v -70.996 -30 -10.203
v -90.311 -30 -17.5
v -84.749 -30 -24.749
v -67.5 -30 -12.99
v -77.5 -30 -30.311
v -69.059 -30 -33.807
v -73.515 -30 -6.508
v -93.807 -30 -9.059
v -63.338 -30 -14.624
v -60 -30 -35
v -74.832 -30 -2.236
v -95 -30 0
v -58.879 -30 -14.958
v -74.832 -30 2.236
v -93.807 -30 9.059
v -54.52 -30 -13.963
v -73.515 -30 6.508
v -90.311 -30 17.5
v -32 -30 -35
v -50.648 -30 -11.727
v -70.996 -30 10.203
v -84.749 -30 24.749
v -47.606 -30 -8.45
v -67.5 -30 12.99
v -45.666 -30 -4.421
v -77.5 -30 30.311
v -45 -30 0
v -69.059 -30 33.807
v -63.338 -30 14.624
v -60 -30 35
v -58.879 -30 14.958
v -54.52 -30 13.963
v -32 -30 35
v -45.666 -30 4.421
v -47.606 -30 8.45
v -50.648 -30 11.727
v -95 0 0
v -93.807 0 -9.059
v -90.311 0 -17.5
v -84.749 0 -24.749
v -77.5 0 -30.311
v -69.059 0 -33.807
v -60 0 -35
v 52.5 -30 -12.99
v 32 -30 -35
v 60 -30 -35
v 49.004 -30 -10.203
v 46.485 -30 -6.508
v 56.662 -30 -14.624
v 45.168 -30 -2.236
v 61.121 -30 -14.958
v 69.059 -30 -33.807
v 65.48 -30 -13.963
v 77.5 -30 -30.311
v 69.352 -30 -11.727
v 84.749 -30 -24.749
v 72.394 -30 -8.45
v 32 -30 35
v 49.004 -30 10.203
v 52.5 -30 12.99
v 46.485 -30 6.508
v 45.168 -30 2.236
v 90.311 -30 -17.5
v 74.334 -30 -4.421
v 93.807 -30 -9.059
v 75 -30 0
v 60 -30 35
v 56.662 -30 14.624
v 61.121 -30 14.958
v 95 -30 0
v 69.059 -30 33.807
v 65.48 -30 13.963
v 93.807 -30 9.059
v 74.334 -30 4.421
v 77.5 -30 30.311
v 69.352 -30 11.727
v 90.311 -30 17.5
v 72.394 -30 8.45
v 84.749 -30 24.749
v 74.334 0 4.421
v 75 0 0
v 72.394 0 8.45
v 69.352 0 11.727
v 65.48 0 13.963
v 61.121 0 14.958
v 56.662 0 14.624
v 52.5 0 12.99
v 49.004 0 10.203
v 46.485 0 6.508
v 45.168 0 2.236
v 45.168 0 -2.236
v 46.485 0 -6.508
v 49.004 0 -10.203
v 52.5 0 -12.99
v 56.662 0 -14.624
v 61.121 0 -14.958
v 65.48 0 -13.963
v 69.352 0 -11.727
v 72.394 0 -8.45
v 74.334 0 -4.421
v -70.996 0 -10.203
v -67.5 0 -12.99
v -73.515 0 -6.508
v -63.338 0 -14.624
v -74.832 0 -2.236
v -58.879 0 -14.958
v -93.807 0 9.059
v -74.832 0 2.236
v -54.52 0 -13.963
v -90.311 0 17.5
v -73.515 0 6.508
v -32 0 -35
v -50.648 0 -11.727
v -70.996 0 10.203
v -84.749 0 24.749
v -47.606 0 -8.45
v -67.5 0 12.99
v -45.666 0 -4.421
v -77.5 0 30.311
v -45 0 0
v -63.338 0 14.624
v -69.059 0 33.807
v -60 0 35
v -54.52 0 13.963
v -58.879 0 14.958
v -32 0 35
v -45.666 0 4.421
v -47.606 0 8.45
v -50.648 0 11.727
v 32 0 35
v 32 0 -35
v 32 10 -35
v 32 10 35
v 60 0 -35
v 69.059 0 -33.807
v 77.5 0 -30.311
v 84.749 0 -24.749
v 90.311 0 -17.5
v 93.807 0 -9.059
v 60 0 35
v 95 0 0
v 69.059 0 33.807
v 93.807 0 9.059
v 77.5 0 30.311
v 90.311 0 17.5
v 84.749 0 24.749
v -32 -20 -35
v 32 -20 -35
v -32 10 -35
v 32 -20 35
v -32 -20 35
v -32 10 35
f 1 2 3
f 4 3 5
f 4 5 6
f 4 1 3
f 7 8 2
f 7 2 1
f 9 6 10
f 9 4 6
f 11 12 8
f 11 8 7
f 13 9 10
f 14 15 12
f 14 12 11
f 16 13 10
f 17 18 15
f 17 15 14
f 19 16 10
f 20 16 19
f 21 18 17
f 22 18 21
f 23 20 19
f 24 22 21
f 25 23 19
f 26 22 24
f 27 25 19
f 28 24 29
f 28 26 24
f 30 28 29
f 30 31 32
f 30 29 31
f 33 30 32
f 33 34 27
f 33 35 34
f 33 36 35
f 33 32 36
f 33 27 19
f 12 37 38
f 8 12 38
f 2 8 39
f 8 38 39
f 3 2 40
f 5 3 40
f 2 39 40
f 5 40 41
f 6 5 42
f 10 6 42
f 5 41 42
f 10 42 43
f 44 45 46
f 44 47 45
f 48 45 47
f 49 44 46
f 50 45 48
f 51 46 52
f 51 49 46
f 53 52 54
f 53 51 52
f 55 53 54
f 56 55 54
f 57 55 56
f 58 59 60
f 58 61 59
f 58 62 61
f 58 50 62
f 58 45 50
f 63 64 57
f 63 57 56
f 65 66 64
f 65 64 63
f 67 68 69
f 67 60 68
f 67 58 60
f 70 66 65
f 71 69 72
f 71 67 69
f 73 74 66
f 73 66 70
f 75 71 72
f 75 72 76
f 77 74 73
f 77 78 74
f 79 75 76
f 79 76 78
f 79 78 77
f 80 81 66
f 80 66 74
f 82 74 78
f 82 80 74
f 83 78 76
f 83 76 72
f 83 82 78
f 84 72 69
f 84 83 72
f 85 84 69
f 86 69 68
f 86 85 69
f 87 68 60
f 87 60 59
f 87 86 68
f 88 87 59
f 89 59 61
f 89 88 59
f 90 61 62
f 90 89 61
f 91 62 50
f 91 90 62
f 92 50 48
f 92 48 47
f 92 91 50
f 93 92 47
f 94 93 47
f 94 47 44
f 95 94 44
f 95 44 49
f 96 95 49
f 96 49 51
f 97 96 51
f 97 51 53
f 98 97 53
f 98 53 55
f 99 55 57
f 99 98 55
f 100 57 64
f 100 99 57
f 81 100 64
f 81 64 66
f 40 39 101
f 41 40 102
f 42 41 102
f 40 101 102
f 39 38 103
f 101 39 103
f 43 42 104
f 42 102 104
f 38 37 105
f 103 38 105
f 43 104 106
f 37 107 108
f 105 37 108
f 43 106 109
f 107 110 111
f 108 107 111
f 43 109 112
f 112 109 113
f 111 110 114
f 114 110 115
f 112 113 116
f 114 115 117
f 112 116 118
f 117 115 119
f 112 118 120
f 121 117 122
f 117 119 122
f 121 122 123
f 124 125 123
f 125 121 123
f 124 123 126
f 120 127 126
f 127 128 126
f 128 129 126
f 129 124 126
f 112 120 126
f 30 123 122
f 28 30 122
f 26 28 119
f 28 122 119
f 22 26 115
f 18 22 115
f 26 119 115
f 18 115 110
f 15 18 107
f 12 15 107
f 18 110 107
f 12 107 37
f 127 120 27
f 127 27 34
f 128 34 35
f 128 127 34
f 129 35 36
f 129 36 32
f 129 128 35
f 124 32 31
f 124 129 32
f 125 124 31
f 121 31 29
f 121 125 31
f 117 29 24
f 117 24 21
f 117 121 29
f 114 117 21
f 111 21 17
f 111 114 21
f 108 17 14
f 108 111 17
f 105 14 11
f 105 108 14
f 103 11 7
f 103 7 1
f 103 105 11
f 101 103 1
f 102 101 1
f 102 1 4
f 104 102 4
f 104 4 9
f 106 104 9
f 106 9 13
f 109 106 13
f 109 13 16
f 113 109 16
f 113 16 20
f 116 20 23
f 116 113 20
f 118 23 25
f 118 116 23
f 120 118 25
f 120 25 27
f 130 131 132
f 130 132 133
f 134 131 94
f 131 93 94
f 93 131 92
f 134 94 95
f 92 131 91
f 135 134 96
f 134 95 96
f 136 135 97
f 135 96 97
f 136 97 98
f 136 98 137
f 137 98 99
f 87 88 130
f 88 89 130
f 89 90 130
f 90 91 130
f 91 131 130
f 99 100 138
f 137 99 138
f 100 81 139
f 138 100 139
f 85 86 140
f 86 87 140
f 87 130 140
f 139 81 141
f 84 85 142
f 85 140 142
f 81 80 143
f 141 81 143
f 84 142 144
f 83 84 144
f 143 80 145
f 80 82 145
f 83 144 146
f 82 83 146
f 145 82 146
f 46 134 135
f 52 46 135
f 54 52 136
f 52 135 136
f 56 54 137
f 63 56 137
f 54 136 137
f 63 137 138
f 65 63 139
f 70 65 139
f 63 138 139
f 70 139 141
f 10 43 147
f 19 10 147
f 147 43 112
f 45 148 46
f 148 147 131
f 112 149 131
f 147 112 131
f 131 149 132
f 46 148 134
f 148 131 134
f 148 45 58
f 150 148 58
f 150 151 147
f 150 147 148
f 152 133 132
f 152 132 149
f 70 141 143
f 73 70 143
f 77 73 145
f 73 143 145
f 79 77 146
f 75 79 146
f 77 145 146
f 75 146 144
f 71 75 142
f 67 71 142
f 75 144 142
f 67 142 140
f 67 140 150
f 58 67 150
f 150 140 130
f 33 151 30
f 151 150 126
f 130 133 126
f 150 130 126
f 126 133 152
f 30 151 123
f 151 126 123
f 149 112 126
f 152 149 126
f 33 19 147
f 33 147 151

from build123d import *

# Parameters (mm, degrees)
F0_R     = 15
F0_W     = 32
F0_H     = 70
F1_DEPTH = 30
F2_W     = 64
F2_H     = 70
F3_DEPTH = 10
F4_W     = 64
F4_H     = 70
F5_DEPTH = 10


with BuildPart() as f1:
    # F0 (on Front) → F1 (new body)
    with BuildSketch(Plane.XZ):
        with BuildLine():
            Line((-32, -35), (-32, 35))
            Line((-32, 35), (-60, 35))
            ThreePointArc((-60, 35), (-84.7487373415, 24.7487373415), (-95, 0))
            ThreePointArc((-95, 0), (-84.7487373415, -24.7487373415), (-60, -35))
            Line((-60, -35), (-32, -35))
        make_face()
        with Locations((-60, 0)):
            Circle(F0_R, mode=Mode.SUBTRACT)
        with Locations((-16, 0)):
            Rectangle(F0_W, F0_H)
        with Locations((16, 0)):
            Rectangle(F0_W, F0_H)
        with BuildLine():
            ThreePointArc((95, 0), (84.7487373415, 24.7487373415), (60, 35))
            Line((60, 35), (32, 35))
            Line((32, 35), (32, -35))
            Line((32, -35), (60, -35))
            ThreePointArc((60, -35), (84.7487373415, -24.7487373415), (95, 0))
        make_face()
        with Locations((60, 0)):
            Circle(F0_R, mode=Mode.SUBTRACT)
    extrude(amount=F1_DEPTH)

    # F2 (on face) → F3 (cut)
    with BuildSketch(Plane.XZ.offset(30)):
        Rectangle(F2_W, F2_H)
    extrude(amount=-F3_DEPTH, mode=Mode.SUBTRACT)

    # F4 (on face) → F5 (join)
    with BuildSketch(Plane(origin=(0, 0, 0), x_dir=(-1, 0, 0), z_dir=(0, 1, 0))):
        Rectangle(F4_W, F4_H)
    extrude(amount=F5_DEPTH)


solid = f1.part
